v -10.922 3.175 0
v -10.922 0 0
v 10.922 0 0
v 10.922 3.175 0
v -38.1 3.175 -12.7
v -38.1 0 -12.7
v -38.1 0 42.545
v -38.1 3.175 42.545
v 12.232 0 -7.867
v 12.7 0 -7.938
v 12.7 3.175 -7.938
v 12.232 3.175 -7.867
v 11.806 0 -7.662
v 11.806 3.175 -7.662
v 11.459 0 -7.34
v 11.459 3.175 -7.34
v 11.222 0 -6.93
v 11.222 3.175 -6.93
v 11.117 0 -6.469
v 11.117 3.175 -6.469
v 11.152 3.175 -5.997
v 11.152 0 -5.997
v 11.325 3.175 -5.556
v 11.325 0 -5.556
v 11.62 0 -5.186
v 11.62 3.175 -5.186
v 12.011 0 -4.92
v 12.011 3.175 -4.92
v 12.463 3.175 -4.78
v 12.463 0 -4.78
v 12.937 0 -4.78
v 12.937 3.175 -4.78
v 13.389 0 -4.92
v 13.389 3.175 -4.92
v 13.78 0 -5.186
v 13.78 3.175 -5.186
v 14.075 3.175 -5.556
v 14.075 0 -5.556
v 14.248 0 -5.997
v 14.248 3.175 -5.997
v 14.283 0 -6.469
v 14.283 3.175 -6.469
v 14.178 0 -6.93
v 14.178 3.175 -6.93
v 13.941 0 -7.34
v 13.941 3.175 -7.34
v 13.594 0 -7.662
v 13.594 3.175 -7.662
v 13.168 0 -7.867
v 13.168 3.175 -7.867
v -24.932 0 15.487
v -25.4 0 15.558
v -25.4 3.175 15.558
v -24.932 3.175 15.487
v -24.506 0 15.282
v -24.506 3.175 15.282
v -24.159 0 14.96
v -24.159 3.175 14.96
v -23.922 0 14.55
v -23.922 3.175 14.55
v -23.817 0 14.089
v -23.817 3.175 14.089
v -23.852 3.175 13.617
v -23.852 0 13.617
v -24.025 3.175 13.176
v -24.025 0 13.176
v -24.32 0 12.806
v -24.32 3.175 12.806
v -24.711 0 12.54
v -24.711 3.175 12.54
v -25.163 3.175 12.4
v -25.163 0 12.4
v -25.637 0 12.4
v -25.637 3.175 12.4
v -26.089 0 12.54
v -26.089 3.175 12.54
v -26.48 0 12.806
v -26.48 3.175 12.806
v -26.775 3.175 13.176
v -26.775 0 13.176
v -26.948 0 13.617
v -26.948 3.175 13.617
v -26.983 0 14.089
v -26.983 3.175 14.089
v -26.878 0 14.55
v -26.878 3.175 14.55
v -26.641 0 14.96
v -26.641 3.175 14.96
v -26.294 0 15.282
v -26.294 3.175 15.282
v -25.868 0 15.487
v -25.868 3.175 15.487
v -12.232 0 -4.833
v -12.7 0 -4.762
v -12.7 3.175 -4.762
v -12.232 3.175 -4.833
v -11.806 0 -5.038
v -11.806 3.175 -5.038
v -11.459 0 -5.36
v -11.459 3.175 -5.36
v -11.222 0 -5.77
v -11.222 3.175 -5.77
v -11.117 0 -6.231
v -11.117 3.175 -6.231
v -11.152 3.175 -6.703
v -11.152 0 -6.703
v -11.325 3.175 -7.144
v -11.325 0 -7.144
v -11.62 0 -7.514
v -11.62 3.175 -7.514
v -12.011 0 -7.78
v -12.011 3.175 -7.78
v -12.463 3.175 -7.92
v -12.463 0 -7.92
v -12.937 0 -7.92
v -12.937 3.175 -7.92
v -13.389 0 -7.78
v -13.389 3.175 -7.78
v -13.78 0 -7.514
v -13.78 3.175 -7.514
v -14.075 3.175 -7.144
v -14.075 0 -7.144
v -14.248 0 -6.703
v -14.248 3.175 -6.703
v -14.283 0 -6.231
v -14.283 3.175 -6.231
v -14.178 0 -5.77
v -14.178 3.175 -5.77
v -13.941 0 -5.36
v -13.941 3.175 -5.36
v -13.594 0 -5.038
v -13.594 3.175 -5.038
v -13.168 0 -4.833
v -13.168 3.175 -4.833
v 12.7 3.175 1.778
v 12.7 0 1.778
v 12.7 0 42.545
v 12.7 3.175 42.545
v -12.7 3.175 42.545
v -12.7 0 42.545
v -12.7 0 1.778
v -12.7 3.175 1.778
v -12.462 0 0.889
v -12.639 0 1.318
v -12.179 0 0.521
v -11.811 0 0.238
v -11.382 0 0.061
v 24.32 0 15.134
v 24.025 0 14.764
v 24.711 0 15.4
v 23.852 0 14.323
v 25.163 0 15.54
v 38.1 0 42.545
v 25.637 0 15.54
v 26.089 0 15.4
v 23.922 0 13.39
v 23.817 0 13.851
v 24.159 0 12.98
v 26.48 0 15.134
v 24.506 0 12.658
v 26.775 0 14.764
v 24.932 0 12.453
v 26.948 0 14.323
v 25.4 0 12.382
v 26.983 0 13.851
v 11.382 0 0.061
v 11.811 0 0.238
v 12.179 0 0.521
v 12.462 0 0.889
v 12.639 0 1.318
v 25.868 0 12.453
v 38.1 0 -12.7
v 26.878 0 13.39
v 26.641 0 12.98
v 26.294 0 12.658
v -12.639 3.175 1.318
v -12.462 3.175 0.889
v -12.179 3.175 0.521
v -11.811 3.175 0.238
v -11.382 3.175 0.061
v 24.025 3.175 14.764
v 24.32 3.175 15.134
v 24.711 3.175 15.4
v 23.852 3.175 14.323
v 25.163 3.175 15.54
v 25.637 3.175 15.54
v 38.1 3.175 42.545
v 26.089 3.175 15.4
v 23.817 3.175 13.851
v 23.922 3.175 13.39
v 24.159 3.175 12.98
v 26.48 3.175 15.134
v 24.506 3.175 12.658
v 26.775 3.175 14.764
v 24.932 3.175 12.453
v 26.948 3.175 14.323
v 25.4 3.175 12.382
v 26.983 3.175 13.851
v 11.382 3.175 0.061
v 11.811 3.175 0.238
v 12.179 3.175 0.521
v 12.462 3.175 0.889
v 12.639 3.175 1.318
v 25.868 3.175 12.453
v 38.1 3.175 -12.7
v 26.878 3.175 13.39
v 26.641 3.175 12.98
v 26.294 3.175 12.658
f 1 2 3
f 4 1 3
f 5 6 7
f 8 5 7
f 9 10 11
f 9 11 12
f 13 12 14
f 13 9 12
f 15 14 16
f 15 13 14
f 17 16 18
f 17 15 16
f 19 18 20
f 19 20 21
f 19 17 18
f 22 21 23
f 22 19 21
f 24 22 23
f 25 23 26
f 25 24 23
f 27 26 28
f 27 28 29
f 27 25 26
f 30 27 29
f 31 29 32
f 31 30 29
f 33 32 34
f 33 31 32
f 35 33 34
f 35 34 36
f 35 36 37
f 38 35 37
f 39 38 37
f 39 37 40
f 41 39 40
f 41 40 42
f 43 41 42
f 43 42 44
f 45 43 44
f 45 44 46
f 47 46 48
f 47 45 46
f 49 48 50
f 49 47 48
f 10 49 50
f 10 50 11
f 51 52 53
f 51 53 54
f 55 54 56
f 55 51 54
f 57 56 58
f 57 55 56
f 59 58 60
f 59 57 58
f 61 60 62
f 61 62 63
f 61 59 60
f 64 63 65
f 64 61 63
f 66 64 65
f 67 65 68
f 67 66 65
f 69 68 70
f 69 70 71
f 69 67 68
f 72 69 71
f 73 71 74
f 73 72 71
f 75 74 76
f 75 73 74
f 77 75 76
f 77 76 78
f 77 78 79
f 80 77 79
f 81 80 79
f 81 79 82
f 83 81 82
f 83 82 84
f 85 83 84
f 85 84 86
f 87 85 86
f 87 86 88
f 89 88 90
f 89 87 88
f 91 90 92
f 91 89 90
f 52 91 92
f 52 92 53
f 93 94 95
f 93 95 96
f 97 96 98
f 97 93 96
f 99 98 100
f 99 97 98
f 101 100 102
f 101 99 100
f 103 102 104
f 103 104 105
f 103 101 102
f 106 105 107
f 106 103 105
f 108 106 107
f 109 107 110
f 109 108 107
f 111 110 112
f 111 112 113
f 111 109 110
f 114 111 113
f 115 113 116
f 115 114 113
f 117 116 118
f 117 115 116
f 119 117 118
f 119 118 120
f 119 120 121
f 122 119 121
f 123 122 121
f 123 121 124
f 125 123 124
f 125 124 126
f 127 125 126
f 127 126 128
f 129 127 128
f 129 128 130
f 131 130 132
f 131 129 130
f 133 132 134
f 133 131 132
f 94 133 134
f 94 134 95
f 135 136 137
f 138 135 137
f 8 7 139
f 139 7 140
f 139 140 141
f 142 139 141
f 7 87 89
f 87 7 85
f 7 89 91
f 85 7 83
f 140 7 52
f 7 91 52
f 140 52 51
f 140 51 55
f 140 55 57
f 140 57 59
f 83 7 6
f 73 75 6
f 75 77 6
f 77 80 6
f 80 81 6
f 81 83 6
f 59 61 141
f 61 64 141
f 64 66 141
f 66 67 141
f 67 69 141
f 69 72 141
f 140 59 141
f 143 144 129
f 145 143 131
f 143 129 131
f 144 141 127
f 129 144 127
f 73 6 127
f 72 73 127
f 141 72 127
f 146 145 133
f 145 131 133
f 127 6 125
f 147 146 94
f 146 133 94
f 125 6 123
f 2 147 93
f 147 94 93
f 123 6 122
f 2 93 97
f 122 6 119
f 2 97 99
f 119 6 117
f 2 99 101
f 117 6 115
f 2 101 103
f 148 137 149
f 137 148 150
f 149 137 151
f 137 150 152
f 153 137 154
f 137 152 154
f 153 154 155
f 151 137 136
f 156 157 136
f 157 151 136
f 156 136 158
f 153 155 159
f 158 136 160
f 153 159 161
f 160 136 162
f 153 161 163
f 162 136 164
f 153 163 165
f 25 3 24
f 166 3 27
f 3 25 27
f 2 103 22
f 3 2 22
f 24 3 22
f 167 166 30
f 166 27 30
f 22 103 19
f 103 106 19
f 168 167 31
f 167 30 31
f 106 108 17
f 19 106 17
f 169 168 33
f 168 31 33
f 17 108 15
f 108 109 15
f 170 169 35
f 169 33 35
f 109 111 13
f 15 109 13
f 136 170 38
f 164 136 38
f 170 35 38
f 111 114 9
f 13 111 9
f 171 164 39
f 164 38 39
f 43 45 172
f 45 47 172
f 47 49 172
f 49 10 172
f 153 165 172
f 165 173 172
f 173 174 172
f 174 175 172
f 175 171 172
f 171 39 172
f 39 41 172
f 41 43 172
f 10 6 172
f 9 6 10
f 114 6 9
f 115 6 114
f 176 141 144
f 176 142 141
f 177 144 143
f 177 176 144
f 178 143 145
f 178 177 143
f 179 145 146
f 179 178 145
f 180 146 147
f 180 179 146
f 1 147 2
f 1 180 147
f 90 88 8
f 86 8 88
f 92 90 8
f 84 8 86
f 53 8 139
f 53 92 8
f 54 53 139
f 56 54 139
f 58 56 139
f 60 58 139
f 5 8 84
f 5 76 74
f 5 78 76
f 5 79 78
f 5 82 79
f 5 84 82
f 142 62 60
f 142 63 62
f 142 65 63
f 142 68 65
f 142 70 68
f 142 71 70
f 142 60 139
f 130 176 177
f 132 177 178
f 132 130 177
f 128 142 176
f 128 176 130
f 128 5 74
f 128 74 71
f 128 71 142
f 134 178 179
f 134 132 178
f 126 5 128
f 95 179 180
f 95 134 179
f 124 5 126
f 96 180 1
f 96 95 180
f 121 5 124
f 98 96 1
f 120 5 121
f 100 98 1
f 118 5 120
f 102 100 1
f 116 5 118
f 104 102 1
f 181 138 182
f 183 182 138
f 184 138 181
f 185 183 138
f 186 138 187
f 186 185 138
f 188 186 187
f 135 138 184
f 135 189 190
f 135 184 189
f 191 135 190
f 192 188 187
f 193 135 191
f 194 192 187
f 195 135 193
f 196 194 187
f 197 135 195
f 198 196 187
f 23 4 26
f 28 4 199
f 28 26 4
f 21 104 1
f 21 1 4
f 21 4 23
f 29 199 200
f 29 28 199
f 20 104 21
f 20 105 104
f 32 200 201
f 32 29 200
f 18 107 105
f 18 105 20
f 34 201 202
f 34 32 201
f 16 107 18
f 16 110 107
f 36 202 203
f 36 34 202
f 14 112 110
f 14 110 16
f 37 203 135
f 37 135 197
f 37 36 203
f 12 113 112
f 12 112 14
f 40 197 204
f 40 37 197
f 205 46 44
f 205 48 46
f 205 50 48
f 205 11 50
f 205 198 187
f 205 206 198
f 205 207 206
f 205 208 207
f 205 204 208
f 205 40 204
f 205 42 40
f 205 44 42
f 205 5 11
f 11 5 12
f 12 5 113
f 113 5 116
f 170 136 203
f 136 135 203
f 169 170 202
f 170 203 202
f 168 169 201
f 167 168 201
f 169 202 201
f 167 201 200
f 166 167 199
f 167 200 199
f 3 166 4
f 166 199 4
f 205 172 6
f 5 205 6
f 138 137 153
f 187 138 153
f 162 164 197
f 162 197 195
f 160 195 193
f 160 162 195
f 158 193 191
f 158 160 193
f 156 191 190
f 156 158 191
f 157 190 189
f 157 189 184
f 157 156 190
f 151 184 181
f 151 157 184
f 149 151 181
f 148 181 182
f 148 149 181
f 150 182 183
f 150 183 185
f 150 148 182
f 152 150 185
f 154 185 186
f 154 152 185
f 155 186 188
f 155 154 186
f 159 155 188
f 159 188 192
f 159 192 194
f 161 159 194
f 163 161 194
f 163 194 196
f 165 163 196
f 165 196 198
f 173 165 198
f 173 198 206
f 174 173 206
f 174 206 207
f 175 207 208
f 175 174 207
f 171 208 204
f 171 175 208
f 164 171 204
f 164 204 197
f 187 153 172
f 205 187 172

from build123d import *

# Parameters (mm, degrees)
SKETCH1_R           = 1.5875
BOSS_EXTRUDE1_DEPTH = 3.175
FILLET1_R           = 1.778


with BuildPart() as part:
    # Sketch1 → Boss-Extrude1 (new body)
    with BuildSketch(Plane(origin=(0, 0, 0), x_dir=(1, 0, 0), z_dir=(0, 1, 0))):
        Polygon((38.1, 12.7), (-38.1, 12.7), (-38.1, -42.545), (-12.7, -42.545), (-12.7, 0), (12.7, 0), (12.7, -42.545), (38.1, -42.545), align=None)
        with Locations(Location((-25.4, -13.97, 0), (0, 0, 270))):
            Circle(SKETCH1_R, mode=Mode.SUBTRACT)
        with Locations(Location((25.4, -13.97, 0), (0, 0, 90))):
            Circle(SKETCH1_R, mode=Mode.SUBTRACT)
        with Locations(Location((-12.7, 6.35, 0), (0, 0, 270))):
            Circle(SKETCH1_R, mode=Mode.SUBTRACT)
        with Locations(Location((12.7, 6.35, 0), (0, 0, 90))):
            Circle(SKETCH1_R, mode=Mode.SUBTRACT)
    extrude(amount=BOSS_EXTRUDE1_DEPTH)

    # Fillet1
    fillet1_edges = [part.edges().sort_by_distance(p)[0] for p in [
        (12.7, 1.5875, 0),
        (-12.7, 1.5875, 0),
    ]]
    fillet(fillet1_edges, radius=FILLET1_R)


solid = part.part
